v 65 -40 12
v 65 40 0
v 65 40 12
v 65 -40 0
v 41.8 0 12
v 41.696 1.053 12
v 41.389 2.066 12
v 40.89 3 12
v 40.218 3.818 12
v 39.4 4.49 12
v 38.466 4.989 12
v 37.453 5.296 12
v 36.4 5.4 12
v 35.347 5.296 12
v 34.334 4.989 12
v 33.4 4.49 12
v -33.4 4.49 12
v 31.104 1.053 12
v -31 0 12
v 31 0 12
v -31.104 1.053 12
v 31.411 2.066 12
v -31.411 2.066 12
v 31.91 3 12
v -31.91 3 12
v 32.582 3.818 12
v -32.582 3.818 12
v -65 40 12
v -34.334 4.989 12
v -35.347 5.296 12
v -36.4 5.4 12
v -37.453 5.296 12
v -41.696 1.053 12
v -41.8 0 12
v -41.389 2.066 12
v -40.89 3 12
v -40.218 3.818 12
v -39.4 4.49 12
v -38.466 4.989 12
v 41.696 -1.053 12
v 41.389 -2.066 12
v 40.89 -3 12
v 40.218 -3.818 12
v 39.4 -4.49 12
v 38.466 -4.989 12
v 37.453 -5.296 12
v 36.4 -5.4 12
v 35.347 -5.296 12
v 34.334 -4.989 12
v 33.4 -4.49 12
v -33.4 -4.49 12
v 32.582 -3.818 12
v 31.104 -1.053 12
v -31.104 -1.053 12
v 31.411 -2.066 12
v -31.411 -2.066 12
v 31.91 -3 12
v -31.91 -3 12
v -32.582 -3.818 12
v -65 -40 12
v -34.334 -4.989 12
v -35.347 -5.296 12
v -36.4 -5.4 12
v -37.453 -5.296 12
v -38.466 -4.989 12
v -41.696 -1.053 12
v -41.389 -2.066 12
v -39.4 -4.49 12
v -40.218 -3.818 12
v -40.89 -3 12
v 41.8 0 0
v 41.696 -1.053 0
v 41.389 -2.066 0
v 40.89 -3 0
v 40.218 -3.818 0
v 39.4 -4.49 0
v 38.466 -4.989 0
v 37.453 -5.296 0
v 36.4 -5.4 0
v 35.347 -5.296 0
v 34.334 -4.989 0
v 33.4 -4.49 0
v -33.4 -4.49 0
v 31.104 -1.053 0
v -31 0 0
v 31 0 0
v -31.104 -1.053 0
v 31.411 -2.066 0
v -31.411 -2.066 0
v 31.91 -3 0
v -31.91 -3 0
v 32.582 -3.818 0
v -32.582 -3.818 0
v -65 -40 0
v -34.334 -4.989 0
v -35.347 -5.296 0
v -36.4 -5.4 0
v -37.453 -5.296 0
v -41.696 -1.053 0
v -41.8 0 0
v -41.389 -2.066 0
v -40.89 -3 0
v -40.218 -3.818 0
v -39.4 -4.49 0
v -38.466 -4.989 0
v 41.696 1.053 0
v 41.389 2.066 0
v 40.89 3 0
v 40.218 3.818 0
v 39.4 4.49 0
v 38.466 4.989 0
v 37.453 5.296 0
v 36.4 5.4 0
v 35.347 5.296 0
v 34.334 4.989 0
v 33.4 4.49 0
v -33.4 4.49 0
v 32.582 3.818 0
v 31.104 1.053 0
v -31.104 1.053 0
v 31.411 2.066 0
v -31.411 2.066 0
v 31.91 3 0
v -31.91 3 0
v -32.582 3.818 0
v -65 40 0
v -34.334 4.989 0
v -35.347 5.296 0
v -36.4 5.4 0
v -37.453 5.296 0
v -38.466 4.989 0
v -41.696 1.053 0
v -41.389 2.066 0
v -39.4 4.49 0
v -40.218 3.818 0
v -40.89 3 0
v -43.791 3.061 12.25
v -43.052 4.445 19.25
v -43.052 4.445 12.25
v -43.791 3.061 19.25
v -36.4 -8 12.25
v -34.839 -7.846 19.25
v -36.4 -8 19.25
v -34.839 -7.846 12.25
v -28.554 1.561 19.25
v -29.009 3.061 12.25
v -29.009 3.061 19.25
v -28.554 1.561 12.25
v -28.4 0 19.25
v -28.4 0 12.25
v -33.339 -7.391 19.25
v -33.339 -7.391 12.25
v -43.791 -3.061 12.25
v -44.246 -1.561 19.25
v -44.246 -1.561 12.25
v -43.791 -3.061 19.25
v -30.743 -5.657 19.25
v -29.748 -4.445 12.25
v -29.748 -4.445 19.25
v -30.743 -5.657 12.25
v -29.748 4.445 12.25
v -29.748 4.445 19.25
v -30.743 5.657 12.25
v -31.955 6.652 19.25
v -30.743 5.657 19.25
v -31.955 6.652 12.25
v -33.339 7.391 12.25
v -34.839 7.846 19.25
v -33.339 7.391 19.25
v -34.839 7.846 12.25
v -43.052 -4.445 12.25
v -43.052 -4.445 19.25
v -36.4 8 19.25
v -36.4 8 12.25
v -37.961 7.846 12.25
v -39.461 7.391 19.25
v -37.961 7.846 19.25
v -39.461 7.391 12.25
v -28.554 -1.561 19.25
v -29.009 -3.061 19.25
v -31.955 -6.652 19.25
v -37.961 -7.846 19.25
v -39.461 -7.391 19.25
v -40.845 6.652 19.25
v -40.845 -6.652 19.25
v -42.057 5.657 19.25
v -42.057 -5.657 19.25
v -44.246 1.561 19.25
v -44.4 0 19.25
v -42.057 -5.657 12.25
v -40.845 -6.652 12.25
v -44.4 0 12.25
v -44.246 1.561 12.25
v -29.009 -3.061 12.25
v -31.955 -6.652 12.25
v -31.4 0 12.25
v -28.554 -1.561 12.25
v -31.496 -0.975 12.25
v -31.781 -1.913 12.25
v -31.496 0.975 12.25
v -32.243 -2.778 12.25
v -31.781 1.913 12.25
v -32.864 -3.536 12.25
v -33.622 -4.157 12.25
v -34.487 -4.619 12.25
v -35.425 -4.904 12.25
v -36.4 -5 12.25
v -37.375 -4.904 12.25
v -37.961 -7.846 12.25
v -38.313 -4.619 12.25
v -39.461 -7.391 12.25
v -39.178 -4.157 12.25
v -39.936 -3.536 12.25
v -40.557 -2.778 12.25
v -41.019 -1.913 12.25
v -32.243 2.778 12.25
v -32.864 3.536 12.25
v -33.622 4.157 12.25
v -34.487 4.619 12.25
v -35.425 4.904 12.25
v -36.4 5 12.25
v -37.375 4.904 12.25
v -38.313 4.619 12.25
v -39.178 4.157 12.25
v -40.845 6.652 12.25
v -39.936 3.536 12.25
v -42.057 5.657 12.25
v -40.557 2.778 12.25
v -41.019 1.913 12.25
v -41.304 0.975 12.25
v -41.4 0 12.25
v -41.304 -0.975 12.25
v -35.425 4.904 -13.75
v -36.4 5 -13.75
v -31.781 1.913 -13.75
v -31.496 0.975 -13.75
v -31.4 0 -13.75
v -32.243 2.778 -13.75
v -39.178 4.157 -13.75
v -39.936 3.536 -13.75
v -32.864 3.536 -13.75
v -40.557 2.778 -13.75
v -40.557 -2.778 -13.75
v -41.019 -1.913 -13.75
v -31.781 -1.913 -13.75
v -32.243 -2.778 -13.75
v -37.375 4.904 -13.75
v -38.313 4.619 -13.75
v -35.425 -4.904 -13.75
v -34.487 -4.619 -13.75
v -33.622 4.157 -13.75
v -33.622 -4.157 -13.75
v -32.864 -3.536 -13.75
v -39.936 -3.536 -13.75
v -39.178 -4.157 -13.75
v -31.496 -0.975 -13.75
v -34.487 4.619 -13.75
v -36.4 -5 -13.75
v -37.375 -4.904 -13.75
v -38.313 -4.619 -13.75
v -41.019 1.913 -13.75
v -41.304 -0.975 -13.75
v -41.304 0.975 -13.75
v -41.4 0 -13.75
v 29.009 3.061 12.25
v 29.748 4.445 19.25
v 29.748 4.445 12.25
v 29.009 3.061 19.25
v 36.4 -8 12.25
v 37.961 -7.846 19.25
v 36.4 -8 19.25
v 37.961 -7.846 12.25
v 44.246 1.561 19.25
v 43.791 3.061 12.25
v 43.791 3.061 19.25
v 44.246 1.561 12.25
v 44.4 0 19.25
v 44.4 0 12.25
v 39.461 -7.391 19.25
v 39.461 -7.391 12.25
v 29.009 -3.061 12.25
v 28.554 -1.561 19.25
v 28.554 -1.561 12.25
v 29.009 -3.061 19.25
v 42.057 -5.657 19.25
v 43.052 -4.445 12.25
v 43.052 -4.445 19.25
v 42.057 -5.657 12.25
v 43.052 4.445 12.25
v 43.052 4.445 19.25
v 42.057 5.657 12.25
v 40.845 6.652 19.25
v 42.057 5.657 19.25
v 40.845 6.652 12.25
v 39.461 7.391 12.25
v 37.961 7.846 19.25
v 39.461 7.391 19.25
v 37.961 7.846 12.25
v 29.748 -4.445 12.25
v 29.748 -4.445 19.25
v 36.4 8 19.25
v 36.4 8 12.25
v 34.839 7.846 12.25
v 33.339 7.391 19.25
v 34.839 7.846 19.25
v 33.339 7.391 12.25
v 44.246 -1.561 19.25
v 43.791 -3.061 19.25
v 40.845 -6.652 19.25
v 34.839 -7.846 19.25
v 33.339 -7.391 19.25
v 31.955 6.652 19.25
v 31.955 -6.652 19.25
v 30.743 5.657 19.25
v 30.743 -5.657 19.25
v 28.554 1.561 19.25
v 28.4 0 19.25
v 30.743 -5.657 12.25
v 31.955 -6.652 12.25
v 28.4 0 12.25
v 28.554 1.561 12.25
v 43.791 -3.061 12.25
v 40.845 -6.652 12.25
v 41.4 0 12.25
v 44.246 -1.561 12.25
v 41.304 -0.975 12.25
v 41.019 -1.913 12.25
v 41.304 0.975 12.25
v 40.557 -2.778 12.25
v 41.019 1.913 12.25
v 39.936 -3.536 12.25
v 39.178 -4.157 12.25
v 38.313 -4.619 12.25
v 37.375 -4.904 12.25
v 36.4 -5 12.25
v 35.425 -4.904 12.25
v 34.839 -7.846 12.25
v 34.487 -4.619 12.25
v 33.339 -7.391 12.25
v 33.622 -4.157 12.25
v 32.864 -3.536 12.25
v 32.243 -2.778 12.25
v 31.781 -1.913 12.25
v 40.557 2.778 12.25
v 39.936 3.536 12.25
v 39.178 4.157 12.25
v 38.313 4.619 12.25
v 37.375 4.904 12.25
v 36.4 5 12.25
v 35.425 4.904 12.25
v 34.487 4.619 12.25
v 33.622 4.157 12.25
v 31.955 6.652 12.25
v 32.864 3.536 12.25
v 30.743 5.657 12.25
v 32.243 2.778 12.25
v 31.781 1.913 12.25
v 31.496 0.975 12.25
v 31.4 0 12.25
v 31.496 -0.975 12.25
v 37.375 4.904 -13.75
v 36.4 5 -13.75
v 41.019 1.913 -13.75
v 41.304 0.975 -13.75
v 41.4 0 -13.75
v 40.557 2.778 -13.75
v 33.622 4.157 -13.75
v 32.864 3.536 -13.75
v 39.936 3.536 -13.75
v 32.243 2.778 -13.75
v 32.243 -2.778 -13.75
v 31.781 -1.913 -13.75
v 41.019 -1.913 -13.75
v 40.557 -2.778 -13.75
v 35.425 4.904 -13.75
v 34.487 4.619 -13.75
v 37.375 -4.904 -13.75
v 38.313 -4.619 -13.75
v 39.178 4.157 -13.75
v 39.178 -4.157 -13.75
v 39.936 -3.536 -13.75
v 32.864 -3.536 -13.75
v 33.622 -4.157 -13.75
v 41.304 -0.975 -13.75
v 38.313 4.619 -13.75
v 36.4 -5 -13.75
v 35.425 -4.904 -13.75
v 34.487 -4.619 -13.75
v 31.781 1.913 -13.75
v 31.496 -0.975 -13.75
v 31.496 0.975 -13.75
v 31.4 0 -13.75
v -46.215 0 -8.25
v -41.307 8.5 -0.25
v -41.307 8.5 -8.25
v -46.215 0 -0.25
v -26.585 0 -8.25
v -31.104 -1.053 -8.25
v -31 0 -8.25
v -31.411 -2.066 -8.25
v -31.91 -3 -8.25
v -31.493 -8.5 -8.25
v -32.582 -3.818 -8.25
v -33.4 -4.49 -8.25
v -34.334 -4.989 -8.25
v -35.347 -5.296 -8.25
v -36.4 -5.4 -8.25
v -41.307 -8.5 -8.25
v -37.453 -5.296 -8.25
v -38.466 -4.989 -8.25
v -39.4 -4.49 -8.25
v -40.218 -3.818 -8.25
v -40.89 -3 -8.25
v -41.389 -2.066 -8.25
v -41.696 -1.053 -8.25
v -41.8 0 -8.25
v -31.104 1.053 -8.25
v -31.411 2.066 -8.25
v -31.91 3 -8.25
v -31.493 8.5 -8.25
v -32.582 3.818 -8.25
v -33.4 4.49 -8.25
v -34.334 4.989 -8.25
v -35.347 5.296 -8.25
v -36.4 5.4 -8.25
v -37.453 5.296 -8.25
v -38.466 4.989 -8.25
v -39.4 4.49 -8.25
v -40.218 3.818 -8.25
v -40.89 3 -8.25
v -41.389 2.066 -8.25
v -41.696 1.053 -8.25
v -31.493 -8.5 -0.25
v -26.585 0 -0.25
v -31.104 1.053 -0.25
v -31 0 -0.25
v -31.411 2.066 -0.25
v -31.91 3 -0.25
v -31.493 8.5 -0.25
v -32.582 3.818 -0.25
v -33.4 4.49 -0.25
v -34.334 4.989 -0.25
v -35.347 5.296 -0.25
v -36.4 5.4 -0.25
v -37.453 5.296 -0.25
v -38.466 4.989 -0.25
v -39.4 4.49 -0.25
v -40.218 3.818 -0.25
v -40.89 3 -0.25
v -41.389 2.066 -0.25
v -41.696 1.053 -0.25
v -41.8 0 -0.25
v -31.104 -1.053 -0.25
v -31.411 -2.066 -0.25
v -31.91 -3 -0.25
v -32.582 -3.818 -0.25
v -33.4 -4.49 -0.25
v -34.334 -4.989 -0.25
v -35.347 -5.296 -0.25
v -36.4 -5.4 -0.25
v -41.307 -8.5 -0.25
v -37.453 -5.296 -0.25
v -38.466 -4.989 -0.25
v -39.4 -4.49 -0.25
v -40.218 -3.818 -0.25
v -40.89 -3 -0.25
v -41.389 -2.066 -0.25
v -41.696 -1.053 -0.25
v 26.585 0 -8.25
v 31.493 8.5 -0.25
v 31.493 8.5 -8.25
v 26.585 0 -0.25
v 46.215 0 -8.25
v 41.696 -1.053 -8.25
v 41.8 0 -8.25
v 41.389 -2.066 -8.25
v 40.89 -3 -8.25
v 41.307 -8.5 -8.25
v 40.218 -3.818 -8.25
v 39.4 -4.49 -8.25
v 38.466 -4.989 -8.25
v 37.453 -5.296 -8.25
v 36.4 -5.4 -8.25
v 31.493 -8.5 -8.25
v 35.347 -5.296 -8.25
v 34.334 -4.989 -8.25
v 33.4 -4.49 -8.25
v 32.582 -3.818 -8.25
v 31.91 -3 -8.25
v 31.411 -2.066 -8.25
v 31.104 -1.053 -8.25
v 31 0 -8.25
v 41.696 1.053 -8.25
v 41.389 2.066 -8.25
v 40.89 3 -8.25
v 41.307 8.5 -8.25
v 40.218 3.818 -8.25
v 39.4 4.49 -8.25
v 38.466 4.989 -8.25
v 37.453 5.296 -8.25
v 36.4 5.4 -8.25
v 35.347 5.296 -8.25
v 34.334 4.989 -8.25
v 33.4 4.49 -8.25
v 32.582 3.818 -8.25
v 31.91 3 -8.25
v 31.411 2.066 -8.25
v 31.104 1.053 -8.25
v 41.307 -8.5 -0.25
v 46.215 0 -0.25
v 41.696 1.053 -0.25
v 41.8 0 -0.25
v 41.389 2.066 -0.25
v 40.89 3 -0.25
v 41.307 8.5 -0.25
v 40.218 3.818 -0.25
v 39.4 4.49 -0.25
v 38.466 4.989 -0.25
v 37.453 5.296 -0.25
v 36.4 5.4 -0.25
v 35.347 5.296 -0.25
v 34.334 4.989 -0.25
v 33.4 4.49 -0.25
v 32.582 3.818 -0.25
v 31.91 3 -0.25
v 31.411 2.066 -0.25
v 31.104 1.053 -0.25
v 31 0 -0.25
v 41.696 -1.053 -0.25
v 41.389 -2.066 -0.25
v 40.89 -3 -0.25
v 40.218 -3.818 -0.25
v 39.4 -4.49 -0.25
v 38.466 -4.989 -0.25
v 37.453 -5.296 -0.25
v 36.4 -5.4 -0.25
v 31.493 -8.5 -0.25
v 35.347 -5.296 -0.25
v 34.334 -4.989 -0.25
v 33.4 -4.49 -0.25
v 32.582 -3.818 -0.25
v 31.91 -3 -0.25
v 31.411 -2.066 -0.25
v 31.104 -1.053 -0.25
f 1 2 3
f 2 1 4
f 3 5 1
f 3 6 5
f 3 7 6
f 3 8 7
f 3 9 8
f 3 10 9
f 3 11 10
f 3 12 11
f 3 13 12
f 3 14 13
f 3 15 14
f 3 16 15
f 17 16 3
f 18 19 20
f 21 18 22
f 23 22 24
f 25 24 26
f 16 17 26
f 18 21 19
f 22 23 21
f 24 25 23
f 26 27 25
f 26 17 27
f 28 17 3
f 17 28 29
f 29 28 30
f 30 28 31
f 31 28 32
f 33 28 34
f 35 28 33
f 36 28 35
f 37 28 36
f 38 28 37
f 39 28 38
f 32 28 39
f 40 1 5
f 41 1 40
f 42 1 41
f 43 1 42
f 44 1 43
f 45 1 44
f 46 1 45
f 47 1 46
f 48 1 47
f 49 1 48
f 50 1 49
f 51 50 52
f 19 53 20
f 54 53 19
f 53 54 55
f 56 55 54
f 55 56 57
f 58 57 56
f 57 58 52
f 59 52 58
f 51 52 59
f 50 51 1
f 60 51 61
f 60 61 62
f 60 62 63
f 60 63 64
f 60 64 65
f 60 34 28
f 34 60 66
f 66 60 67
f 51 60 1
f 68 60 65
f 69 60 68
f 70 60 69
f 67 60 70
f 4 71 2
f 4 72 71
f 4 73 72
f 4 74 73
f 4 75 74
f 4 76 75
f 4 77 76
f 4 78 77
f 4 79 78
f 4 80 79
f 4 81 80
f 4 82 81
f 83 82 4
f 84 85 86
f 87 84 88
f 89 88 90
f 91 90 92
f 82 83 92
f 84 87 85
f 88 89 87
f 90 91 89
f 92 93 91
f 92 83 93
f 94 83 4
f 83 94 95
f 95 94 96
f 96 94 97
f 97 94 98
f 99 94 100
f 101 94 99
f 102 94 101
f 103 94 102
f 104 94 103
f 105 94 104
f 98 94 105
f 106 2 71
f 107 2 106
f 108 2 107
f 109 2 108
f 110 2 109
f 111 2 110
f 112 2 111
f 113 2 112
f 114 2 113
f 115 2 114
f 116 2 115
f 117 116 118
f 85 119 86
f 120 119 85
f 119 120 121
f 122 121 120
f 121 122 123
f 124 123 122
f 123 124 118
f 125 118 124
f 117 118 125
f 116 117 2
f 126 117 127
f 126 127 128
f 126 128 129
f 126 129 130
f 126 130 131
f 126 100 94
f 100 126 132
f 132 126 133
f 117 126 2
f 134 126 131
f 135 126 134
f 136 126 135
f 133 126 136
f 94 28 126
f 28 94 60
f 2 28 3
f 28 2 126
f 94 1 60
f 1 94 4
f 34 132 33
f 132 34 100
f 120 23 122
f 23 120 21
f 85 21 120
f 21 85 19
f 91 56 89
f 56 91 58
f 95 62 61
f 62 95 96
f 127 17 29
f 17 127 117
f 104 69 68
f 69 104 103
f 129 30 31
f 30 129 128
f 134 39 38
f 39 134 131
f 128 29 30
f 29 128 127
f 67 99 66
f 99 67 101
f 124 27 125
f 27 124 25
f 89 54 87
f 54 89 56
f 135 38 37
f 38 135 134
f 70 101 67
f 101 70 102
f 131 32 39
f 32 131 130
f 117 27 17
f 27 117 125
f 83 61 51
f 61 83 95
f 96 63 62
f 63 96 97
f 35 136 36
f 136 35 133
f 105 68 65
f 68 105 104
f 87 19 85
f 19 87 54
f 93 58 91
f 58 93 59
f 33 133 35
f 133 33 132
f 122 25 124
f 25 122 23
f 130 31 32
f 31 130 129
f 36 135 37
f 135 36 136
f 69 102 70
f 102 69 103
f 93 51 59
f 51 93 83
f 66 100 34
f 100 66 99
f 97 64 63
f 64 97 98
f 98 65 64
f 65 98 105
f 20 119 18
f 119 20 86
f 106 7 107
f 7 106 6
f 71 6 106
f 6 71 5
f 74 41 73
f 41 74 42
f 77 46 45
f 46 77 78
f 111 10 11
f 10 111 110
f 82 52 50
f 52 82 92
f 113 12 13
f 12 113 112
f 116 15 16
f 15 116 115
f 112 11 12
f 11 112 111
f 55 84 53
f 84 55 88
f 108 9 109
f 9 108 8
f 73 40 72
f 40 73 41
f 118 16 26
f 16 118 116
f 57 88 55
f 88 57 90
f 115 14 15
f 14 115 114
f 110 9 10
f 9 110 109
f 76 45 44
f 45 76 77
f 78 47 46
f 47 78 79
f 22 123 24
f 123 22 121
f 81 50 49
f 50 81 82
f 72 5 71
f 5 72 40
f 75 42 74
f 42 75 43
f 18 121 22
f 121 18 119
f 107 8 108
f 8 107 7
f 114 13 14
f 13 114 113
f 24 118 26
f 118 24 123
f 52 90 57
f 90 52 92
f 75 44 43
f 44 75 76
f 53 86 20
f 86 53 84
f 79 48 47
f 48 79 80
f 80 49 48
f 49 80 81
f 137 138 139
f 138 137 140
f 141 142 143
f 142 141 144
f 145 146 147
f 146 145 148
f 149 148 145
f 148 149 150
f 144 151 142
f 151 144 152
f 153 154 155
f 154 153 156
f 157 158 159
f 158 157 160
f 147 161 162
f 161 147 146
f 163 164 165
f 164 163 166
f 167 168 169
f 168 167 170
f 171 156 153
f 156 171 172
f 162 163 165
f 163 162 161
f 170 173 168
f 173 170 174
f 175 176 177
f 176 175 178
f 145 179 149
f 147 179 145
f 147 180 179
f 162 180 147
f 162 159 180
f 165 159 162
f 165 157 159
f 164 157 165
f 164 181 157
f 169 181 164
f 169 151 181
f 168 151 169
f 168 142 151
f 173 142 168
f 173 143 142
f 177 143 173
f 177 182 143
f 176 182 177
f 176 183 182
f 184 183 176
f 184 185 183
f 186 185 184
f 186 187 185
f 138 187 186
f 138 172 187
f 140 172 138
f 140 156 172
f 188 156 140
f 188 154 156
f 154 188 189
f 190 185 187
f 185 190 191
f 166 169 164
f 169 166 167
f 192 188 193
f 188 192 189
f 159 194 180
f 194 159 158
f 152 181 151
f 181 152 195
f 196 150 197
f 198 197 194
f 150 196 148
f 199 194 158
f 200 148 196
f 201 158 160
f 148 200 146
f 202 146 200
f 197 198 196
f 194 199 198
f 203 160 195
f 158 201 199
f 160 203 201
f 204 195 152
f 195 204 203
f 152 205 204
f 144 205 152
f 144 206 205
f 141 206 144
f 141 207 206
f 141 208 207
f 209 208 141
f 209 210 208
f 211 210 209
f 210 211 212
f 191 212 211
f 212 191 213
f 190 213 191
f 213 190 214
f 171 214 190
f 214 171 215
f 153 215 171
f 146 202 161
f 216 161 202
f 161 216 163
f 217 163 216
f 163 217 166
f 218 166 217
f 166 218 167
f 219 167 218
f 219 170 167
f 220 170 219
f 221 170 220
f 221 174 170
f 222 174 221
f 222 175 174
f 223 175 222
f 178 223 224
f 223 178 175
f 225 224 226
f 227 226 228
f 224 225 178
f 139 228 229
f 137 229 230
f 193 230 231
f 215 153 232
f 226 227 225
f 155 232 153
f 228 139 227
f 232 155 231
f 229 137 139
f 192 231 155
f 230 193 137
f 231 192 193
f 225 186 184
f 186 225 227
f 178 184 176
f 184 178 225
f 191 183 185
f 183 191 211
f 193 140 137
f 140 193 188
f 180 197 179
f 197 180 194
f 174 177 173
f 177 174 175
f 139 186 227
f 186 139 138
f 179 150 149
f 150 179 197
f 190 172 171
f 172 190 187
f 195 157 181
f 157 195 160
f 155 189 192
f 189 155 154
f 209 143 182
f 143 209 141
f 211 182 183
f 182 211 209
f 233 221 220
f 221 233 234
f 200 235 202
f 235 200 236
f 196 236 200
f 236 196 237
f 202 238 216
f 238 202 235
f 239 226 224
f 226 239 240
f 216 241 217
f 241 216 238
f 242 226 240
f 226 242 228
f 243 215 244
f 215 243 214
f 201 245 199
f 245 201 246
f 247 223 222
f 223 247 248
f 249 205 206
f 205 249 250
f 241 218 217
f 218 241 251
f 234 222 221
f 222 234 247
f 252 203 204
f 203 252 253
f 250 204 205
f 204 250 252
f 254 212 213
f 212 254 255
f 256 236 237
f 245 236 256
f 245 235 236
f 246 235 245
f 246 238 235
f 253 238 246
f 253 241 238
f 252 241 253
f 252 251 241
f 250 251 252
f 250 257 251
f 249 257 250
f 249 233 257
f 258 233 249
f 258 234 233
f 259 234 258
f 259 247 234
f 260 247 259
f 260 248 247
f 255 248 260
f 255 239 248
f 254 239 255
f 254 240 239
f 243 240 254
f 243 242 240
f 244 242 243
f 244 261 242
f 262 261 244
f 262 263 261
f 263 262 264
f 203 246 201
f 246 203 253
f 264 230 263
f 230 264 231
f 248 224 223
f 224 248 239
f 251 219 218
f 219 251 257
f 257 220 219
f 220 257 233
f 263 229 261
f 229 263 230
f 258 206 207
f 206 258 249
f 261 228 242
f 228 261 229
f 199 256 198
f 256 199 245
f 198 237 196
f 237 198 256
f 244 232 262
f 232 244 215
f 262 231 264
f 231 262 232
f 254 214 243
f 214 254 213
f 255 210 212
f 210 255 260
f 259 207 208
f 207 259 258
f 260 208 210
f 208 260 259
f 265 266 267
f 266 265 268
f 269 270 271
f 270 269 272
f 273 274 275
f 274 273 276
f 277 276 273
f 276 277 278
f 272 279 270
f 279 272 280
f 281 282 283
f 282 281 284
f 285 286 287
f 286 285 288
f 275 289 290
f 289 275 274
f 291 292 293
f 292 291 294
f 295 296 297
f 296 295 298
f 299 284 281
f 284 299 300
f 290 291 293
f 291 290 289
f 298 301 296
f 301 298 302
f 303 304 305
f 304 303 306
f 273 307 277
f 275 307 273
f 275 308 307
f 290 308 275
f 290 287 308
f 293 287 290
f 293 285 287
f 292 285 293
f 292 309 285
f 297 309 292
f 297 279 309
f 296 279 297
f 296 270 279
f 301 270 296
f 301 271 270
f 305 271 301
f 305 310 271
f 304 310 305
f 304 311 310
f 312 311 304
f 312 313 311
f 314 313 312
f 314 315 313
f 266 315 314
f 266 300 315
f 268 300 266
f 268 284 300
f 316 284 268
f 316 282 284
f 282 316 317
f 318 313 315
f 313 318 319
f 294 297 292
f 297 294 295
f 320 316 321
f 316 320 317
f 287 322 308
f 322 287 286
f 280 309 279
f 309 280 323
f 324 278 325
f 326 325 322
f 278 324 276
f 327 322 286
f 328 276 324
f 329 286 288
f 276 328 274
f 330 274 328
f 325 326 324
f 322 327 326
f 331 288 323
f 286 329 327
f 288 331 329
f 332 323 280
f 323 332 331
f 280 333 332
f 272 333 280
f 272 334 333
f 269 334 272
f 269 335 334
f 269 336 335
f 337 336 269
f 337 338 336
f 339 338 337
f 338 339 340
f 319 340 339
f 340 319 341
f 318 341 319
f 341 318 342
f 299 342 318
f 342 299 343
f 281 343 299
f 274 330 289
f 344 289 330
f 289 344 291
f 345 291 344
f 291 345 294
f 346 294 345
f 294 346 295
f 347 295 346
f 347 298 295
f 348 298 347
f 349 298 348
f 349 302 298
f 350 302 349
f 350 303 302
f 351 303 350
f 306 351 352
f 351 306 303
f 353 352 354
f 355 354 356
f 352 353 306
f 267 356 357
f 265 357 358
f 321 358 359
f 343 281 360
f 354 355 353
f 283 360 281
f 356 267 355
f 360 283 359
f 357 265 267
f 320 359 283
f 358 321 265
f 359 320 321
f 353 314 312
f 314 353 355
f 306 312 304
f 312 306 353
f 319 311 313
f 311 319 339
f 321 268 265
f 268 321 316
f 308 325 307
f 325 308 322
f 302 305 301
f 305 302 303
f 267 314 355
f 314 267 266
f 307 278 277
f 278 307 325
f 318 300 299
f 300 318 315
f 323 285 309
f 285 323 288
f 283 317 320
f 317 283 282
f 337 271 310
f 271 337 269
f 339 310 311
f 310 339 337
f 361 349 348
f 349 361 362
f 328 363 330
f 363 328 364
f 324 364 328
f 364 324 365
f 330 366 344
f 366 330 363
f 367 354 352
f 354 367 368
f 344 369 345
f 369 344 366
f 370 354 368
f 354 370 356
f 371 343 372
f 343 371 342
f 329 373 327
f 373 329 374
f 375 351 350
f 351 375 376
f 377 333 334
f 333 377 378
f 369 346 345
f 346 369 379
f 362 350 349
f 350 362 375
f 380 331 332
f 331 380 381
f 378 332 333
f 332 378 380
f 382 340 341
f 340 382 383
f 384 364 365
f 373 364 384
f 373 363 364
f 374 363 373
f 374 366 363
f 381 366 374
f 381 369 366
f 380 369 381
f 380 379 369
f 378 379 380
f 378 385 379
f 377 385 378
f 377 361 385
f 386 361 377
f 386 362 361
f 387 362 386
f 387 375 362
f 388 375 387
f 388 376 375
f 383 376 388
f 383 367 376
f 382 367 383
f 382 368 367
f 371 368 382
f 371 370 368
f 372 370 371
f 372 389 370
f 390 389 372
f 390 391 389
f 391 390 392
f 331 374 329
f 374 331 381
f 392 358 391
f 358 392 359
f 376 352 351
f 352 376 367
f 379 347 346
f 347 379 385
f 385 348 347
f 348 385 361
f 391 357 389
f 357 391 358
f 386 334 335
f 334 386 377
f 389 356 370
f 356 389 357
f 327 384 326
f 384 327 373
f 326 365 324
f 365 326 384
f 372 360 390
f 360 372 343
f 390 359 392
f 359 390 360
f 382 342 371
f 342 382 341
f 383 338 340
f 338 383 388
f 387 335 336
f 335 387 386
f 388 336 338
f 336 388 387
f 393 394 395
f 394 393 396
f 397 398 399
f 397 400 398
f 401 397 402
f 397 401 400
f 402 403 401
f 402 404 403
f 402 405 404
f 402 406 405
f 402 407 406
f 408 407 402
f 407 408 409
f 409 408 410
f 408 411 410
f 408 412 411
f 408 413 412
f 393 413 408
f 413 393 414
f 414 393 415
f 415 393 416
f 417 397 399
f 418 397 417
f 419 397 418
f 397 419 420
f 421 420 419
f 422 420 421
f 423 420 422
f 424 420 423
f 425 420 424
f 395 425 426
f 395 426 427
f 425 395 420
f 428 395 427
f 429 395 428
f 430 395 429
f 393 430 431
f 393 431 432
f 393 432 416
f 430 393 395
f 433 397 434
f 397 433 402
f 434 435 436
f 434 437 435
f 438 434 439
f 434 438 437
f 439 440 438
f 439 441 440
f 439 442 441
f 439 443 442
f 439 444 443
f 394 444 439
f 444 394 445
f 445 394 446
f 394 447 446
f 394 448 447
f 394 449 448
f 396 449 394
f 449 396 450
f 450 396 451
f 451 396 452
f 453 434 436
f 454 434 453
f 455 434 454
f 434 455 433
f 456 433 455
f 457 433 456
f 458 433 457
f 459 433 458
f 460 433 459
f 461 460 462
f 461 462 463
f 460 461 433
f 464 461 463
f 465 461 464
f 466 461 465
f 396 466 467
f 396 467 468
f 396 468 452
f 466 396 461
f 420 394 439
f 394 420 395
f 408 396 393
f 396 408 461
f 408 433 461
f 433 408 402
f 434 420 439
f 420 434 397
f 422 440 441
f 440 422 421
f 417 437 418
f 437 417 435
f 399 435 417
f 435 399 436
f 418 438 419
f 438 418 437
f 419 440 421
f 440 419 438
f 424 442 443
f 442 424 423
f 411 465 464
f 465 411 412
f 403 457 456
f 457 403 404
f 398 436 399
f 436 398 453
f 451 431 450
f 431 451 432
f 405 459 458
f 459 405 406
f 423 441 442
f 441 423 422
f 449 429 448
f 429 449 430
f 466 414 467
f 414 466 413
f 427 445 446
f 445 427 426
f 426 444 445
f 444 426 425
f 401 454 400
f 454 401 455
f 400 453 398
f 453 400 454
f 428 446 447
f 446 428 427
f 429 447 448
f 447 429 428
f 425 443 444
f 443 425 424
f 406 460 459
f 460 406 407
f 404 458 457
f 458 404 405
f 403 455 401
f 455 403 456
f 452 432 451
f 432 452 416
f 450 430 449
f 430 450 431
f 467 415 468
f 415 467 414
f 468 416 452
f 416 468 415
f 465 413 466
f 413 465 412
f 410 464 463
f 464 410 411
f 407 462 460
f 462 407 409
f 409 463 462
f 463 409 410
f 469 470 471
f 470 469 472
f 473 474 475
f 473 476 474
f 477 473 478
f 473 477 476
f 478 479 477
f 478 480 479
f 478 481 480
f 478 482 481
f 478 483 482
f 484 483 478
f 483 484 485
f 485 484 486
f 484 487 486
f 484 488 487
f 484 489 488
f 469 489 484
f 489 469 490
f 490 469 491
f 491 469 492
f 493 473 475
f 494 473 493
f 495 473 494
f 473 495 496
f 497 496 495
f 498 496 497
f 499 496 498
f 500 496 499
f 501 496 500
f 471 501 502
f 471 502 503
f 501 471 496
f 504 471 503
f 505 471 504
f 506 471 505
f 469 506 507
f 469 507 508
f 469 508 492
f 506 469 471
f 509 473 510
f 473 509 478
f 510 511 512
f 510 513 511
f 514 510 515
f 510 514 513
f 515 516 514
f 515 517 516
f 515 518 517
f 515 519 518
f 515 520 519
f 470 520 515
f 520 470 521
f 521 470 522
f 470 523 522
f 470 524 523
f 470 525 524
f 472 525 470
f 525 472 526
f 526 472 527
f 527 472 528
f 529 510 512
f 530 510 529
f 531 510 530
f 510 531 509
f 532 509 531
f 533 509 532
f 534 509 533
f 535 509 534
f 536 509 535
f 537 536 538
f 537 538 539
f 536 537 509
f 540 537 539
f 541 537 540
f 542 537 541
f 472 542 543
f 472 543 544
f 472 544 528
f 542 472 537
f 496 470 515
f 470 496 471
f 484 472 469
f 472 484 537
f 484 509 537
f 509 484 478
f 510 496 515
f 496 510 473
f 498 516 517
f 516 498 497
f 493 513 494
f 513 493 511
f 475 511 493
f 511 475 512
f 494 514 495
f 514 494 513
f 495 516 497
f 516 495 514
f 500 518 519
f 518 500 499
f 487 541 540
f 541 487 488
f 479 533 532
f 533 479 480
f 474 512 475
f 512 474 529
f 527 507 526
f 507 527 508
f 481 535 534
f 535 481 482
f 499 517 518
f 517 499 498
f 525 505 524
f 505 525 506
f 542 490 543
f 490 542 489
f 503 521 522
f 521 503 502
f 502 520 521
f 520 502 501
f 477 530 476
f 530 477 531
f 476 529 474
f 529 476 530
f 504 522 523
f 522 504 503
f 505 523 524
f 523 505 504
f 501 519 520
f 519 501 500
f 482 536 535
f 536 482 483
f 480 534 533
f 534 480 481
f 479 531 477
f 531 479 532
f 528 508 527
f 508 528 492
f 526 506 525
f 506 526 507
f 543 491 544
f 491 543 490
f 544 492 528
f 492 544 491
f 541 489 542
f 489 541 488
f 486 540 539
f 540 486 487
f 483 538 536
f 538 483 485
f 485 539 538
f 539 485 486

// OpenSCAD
$fn = 32;

// ------------------------------------------------------------------------
// Bolted plate: 130 x 80 x 12 mm plate, 2 fasteners
// Every part is its own module, assembly() places them once.
// ------------------------------------------------------------------------

// --- part 1 ---
module plate() {
  difference() {
    translate([-65, -40, 0]) cube([130, 80, 12]);
    translate([-36.4, 0, -1]) cylinder(h = 14, d = 10.8);
    translate([36.4, 0, -1]) cylinder(h = 14, d = 10.8);
  }
}

// --- part 2 ---
module bolt1() {
  cylinder(h = 7, d = 16);
  translate([0, 0, -26]) cylinder(h = 26, d = 10);
}

// --- part 3 ---
module bolt2() {
  cylinder(h = 7, d = 16);
  translate([0, 0, -26]) cylinder(h = 26, d = 10);
}

// --- part 4 ---
module nut1() {
  difference() {
    linear_extrude(height = 8) polygon(points = [[9.815, 0], [4.907, 8.5], [-4.907, 8.5], [-9.815, 0], [-4.907, -8.5], [4.907, -8.5]]);
    translate([0, 0, -1]) cylinder(h = 10, d = 10.8);
  }
}

// --- part 5 ---
module nut2() {
  difference() {
    linear_extrude(height = 8) polygon(points = [[9.815, 0], [4.907, 8.5], [-4.907, 8.5], [-9.815, 0], [-4.907, -8.5], [4.907, -8.5]]);
    translate([0, 0, -1]) cylinder(h = 10, d = 10.8);
  }
}

// --- assembly ---
module assembly() {
  translate([0, 0, 0]) rotate([0, 0, 0]) plate();
  translate([-36.4, 0, 12.25]) rotate([0, 0, 0]) bolt1();
  translate([36.4, 0, 12.25]) rotate([0, 0, 0]) bolt2();
  translate([-36.4, 0, -8.25]) rotate([0, 0, 0]) nut1();
  translate([36.4, 0, -8.25]) rotate([0, 0, 0]) nut2();
}

assembly();
